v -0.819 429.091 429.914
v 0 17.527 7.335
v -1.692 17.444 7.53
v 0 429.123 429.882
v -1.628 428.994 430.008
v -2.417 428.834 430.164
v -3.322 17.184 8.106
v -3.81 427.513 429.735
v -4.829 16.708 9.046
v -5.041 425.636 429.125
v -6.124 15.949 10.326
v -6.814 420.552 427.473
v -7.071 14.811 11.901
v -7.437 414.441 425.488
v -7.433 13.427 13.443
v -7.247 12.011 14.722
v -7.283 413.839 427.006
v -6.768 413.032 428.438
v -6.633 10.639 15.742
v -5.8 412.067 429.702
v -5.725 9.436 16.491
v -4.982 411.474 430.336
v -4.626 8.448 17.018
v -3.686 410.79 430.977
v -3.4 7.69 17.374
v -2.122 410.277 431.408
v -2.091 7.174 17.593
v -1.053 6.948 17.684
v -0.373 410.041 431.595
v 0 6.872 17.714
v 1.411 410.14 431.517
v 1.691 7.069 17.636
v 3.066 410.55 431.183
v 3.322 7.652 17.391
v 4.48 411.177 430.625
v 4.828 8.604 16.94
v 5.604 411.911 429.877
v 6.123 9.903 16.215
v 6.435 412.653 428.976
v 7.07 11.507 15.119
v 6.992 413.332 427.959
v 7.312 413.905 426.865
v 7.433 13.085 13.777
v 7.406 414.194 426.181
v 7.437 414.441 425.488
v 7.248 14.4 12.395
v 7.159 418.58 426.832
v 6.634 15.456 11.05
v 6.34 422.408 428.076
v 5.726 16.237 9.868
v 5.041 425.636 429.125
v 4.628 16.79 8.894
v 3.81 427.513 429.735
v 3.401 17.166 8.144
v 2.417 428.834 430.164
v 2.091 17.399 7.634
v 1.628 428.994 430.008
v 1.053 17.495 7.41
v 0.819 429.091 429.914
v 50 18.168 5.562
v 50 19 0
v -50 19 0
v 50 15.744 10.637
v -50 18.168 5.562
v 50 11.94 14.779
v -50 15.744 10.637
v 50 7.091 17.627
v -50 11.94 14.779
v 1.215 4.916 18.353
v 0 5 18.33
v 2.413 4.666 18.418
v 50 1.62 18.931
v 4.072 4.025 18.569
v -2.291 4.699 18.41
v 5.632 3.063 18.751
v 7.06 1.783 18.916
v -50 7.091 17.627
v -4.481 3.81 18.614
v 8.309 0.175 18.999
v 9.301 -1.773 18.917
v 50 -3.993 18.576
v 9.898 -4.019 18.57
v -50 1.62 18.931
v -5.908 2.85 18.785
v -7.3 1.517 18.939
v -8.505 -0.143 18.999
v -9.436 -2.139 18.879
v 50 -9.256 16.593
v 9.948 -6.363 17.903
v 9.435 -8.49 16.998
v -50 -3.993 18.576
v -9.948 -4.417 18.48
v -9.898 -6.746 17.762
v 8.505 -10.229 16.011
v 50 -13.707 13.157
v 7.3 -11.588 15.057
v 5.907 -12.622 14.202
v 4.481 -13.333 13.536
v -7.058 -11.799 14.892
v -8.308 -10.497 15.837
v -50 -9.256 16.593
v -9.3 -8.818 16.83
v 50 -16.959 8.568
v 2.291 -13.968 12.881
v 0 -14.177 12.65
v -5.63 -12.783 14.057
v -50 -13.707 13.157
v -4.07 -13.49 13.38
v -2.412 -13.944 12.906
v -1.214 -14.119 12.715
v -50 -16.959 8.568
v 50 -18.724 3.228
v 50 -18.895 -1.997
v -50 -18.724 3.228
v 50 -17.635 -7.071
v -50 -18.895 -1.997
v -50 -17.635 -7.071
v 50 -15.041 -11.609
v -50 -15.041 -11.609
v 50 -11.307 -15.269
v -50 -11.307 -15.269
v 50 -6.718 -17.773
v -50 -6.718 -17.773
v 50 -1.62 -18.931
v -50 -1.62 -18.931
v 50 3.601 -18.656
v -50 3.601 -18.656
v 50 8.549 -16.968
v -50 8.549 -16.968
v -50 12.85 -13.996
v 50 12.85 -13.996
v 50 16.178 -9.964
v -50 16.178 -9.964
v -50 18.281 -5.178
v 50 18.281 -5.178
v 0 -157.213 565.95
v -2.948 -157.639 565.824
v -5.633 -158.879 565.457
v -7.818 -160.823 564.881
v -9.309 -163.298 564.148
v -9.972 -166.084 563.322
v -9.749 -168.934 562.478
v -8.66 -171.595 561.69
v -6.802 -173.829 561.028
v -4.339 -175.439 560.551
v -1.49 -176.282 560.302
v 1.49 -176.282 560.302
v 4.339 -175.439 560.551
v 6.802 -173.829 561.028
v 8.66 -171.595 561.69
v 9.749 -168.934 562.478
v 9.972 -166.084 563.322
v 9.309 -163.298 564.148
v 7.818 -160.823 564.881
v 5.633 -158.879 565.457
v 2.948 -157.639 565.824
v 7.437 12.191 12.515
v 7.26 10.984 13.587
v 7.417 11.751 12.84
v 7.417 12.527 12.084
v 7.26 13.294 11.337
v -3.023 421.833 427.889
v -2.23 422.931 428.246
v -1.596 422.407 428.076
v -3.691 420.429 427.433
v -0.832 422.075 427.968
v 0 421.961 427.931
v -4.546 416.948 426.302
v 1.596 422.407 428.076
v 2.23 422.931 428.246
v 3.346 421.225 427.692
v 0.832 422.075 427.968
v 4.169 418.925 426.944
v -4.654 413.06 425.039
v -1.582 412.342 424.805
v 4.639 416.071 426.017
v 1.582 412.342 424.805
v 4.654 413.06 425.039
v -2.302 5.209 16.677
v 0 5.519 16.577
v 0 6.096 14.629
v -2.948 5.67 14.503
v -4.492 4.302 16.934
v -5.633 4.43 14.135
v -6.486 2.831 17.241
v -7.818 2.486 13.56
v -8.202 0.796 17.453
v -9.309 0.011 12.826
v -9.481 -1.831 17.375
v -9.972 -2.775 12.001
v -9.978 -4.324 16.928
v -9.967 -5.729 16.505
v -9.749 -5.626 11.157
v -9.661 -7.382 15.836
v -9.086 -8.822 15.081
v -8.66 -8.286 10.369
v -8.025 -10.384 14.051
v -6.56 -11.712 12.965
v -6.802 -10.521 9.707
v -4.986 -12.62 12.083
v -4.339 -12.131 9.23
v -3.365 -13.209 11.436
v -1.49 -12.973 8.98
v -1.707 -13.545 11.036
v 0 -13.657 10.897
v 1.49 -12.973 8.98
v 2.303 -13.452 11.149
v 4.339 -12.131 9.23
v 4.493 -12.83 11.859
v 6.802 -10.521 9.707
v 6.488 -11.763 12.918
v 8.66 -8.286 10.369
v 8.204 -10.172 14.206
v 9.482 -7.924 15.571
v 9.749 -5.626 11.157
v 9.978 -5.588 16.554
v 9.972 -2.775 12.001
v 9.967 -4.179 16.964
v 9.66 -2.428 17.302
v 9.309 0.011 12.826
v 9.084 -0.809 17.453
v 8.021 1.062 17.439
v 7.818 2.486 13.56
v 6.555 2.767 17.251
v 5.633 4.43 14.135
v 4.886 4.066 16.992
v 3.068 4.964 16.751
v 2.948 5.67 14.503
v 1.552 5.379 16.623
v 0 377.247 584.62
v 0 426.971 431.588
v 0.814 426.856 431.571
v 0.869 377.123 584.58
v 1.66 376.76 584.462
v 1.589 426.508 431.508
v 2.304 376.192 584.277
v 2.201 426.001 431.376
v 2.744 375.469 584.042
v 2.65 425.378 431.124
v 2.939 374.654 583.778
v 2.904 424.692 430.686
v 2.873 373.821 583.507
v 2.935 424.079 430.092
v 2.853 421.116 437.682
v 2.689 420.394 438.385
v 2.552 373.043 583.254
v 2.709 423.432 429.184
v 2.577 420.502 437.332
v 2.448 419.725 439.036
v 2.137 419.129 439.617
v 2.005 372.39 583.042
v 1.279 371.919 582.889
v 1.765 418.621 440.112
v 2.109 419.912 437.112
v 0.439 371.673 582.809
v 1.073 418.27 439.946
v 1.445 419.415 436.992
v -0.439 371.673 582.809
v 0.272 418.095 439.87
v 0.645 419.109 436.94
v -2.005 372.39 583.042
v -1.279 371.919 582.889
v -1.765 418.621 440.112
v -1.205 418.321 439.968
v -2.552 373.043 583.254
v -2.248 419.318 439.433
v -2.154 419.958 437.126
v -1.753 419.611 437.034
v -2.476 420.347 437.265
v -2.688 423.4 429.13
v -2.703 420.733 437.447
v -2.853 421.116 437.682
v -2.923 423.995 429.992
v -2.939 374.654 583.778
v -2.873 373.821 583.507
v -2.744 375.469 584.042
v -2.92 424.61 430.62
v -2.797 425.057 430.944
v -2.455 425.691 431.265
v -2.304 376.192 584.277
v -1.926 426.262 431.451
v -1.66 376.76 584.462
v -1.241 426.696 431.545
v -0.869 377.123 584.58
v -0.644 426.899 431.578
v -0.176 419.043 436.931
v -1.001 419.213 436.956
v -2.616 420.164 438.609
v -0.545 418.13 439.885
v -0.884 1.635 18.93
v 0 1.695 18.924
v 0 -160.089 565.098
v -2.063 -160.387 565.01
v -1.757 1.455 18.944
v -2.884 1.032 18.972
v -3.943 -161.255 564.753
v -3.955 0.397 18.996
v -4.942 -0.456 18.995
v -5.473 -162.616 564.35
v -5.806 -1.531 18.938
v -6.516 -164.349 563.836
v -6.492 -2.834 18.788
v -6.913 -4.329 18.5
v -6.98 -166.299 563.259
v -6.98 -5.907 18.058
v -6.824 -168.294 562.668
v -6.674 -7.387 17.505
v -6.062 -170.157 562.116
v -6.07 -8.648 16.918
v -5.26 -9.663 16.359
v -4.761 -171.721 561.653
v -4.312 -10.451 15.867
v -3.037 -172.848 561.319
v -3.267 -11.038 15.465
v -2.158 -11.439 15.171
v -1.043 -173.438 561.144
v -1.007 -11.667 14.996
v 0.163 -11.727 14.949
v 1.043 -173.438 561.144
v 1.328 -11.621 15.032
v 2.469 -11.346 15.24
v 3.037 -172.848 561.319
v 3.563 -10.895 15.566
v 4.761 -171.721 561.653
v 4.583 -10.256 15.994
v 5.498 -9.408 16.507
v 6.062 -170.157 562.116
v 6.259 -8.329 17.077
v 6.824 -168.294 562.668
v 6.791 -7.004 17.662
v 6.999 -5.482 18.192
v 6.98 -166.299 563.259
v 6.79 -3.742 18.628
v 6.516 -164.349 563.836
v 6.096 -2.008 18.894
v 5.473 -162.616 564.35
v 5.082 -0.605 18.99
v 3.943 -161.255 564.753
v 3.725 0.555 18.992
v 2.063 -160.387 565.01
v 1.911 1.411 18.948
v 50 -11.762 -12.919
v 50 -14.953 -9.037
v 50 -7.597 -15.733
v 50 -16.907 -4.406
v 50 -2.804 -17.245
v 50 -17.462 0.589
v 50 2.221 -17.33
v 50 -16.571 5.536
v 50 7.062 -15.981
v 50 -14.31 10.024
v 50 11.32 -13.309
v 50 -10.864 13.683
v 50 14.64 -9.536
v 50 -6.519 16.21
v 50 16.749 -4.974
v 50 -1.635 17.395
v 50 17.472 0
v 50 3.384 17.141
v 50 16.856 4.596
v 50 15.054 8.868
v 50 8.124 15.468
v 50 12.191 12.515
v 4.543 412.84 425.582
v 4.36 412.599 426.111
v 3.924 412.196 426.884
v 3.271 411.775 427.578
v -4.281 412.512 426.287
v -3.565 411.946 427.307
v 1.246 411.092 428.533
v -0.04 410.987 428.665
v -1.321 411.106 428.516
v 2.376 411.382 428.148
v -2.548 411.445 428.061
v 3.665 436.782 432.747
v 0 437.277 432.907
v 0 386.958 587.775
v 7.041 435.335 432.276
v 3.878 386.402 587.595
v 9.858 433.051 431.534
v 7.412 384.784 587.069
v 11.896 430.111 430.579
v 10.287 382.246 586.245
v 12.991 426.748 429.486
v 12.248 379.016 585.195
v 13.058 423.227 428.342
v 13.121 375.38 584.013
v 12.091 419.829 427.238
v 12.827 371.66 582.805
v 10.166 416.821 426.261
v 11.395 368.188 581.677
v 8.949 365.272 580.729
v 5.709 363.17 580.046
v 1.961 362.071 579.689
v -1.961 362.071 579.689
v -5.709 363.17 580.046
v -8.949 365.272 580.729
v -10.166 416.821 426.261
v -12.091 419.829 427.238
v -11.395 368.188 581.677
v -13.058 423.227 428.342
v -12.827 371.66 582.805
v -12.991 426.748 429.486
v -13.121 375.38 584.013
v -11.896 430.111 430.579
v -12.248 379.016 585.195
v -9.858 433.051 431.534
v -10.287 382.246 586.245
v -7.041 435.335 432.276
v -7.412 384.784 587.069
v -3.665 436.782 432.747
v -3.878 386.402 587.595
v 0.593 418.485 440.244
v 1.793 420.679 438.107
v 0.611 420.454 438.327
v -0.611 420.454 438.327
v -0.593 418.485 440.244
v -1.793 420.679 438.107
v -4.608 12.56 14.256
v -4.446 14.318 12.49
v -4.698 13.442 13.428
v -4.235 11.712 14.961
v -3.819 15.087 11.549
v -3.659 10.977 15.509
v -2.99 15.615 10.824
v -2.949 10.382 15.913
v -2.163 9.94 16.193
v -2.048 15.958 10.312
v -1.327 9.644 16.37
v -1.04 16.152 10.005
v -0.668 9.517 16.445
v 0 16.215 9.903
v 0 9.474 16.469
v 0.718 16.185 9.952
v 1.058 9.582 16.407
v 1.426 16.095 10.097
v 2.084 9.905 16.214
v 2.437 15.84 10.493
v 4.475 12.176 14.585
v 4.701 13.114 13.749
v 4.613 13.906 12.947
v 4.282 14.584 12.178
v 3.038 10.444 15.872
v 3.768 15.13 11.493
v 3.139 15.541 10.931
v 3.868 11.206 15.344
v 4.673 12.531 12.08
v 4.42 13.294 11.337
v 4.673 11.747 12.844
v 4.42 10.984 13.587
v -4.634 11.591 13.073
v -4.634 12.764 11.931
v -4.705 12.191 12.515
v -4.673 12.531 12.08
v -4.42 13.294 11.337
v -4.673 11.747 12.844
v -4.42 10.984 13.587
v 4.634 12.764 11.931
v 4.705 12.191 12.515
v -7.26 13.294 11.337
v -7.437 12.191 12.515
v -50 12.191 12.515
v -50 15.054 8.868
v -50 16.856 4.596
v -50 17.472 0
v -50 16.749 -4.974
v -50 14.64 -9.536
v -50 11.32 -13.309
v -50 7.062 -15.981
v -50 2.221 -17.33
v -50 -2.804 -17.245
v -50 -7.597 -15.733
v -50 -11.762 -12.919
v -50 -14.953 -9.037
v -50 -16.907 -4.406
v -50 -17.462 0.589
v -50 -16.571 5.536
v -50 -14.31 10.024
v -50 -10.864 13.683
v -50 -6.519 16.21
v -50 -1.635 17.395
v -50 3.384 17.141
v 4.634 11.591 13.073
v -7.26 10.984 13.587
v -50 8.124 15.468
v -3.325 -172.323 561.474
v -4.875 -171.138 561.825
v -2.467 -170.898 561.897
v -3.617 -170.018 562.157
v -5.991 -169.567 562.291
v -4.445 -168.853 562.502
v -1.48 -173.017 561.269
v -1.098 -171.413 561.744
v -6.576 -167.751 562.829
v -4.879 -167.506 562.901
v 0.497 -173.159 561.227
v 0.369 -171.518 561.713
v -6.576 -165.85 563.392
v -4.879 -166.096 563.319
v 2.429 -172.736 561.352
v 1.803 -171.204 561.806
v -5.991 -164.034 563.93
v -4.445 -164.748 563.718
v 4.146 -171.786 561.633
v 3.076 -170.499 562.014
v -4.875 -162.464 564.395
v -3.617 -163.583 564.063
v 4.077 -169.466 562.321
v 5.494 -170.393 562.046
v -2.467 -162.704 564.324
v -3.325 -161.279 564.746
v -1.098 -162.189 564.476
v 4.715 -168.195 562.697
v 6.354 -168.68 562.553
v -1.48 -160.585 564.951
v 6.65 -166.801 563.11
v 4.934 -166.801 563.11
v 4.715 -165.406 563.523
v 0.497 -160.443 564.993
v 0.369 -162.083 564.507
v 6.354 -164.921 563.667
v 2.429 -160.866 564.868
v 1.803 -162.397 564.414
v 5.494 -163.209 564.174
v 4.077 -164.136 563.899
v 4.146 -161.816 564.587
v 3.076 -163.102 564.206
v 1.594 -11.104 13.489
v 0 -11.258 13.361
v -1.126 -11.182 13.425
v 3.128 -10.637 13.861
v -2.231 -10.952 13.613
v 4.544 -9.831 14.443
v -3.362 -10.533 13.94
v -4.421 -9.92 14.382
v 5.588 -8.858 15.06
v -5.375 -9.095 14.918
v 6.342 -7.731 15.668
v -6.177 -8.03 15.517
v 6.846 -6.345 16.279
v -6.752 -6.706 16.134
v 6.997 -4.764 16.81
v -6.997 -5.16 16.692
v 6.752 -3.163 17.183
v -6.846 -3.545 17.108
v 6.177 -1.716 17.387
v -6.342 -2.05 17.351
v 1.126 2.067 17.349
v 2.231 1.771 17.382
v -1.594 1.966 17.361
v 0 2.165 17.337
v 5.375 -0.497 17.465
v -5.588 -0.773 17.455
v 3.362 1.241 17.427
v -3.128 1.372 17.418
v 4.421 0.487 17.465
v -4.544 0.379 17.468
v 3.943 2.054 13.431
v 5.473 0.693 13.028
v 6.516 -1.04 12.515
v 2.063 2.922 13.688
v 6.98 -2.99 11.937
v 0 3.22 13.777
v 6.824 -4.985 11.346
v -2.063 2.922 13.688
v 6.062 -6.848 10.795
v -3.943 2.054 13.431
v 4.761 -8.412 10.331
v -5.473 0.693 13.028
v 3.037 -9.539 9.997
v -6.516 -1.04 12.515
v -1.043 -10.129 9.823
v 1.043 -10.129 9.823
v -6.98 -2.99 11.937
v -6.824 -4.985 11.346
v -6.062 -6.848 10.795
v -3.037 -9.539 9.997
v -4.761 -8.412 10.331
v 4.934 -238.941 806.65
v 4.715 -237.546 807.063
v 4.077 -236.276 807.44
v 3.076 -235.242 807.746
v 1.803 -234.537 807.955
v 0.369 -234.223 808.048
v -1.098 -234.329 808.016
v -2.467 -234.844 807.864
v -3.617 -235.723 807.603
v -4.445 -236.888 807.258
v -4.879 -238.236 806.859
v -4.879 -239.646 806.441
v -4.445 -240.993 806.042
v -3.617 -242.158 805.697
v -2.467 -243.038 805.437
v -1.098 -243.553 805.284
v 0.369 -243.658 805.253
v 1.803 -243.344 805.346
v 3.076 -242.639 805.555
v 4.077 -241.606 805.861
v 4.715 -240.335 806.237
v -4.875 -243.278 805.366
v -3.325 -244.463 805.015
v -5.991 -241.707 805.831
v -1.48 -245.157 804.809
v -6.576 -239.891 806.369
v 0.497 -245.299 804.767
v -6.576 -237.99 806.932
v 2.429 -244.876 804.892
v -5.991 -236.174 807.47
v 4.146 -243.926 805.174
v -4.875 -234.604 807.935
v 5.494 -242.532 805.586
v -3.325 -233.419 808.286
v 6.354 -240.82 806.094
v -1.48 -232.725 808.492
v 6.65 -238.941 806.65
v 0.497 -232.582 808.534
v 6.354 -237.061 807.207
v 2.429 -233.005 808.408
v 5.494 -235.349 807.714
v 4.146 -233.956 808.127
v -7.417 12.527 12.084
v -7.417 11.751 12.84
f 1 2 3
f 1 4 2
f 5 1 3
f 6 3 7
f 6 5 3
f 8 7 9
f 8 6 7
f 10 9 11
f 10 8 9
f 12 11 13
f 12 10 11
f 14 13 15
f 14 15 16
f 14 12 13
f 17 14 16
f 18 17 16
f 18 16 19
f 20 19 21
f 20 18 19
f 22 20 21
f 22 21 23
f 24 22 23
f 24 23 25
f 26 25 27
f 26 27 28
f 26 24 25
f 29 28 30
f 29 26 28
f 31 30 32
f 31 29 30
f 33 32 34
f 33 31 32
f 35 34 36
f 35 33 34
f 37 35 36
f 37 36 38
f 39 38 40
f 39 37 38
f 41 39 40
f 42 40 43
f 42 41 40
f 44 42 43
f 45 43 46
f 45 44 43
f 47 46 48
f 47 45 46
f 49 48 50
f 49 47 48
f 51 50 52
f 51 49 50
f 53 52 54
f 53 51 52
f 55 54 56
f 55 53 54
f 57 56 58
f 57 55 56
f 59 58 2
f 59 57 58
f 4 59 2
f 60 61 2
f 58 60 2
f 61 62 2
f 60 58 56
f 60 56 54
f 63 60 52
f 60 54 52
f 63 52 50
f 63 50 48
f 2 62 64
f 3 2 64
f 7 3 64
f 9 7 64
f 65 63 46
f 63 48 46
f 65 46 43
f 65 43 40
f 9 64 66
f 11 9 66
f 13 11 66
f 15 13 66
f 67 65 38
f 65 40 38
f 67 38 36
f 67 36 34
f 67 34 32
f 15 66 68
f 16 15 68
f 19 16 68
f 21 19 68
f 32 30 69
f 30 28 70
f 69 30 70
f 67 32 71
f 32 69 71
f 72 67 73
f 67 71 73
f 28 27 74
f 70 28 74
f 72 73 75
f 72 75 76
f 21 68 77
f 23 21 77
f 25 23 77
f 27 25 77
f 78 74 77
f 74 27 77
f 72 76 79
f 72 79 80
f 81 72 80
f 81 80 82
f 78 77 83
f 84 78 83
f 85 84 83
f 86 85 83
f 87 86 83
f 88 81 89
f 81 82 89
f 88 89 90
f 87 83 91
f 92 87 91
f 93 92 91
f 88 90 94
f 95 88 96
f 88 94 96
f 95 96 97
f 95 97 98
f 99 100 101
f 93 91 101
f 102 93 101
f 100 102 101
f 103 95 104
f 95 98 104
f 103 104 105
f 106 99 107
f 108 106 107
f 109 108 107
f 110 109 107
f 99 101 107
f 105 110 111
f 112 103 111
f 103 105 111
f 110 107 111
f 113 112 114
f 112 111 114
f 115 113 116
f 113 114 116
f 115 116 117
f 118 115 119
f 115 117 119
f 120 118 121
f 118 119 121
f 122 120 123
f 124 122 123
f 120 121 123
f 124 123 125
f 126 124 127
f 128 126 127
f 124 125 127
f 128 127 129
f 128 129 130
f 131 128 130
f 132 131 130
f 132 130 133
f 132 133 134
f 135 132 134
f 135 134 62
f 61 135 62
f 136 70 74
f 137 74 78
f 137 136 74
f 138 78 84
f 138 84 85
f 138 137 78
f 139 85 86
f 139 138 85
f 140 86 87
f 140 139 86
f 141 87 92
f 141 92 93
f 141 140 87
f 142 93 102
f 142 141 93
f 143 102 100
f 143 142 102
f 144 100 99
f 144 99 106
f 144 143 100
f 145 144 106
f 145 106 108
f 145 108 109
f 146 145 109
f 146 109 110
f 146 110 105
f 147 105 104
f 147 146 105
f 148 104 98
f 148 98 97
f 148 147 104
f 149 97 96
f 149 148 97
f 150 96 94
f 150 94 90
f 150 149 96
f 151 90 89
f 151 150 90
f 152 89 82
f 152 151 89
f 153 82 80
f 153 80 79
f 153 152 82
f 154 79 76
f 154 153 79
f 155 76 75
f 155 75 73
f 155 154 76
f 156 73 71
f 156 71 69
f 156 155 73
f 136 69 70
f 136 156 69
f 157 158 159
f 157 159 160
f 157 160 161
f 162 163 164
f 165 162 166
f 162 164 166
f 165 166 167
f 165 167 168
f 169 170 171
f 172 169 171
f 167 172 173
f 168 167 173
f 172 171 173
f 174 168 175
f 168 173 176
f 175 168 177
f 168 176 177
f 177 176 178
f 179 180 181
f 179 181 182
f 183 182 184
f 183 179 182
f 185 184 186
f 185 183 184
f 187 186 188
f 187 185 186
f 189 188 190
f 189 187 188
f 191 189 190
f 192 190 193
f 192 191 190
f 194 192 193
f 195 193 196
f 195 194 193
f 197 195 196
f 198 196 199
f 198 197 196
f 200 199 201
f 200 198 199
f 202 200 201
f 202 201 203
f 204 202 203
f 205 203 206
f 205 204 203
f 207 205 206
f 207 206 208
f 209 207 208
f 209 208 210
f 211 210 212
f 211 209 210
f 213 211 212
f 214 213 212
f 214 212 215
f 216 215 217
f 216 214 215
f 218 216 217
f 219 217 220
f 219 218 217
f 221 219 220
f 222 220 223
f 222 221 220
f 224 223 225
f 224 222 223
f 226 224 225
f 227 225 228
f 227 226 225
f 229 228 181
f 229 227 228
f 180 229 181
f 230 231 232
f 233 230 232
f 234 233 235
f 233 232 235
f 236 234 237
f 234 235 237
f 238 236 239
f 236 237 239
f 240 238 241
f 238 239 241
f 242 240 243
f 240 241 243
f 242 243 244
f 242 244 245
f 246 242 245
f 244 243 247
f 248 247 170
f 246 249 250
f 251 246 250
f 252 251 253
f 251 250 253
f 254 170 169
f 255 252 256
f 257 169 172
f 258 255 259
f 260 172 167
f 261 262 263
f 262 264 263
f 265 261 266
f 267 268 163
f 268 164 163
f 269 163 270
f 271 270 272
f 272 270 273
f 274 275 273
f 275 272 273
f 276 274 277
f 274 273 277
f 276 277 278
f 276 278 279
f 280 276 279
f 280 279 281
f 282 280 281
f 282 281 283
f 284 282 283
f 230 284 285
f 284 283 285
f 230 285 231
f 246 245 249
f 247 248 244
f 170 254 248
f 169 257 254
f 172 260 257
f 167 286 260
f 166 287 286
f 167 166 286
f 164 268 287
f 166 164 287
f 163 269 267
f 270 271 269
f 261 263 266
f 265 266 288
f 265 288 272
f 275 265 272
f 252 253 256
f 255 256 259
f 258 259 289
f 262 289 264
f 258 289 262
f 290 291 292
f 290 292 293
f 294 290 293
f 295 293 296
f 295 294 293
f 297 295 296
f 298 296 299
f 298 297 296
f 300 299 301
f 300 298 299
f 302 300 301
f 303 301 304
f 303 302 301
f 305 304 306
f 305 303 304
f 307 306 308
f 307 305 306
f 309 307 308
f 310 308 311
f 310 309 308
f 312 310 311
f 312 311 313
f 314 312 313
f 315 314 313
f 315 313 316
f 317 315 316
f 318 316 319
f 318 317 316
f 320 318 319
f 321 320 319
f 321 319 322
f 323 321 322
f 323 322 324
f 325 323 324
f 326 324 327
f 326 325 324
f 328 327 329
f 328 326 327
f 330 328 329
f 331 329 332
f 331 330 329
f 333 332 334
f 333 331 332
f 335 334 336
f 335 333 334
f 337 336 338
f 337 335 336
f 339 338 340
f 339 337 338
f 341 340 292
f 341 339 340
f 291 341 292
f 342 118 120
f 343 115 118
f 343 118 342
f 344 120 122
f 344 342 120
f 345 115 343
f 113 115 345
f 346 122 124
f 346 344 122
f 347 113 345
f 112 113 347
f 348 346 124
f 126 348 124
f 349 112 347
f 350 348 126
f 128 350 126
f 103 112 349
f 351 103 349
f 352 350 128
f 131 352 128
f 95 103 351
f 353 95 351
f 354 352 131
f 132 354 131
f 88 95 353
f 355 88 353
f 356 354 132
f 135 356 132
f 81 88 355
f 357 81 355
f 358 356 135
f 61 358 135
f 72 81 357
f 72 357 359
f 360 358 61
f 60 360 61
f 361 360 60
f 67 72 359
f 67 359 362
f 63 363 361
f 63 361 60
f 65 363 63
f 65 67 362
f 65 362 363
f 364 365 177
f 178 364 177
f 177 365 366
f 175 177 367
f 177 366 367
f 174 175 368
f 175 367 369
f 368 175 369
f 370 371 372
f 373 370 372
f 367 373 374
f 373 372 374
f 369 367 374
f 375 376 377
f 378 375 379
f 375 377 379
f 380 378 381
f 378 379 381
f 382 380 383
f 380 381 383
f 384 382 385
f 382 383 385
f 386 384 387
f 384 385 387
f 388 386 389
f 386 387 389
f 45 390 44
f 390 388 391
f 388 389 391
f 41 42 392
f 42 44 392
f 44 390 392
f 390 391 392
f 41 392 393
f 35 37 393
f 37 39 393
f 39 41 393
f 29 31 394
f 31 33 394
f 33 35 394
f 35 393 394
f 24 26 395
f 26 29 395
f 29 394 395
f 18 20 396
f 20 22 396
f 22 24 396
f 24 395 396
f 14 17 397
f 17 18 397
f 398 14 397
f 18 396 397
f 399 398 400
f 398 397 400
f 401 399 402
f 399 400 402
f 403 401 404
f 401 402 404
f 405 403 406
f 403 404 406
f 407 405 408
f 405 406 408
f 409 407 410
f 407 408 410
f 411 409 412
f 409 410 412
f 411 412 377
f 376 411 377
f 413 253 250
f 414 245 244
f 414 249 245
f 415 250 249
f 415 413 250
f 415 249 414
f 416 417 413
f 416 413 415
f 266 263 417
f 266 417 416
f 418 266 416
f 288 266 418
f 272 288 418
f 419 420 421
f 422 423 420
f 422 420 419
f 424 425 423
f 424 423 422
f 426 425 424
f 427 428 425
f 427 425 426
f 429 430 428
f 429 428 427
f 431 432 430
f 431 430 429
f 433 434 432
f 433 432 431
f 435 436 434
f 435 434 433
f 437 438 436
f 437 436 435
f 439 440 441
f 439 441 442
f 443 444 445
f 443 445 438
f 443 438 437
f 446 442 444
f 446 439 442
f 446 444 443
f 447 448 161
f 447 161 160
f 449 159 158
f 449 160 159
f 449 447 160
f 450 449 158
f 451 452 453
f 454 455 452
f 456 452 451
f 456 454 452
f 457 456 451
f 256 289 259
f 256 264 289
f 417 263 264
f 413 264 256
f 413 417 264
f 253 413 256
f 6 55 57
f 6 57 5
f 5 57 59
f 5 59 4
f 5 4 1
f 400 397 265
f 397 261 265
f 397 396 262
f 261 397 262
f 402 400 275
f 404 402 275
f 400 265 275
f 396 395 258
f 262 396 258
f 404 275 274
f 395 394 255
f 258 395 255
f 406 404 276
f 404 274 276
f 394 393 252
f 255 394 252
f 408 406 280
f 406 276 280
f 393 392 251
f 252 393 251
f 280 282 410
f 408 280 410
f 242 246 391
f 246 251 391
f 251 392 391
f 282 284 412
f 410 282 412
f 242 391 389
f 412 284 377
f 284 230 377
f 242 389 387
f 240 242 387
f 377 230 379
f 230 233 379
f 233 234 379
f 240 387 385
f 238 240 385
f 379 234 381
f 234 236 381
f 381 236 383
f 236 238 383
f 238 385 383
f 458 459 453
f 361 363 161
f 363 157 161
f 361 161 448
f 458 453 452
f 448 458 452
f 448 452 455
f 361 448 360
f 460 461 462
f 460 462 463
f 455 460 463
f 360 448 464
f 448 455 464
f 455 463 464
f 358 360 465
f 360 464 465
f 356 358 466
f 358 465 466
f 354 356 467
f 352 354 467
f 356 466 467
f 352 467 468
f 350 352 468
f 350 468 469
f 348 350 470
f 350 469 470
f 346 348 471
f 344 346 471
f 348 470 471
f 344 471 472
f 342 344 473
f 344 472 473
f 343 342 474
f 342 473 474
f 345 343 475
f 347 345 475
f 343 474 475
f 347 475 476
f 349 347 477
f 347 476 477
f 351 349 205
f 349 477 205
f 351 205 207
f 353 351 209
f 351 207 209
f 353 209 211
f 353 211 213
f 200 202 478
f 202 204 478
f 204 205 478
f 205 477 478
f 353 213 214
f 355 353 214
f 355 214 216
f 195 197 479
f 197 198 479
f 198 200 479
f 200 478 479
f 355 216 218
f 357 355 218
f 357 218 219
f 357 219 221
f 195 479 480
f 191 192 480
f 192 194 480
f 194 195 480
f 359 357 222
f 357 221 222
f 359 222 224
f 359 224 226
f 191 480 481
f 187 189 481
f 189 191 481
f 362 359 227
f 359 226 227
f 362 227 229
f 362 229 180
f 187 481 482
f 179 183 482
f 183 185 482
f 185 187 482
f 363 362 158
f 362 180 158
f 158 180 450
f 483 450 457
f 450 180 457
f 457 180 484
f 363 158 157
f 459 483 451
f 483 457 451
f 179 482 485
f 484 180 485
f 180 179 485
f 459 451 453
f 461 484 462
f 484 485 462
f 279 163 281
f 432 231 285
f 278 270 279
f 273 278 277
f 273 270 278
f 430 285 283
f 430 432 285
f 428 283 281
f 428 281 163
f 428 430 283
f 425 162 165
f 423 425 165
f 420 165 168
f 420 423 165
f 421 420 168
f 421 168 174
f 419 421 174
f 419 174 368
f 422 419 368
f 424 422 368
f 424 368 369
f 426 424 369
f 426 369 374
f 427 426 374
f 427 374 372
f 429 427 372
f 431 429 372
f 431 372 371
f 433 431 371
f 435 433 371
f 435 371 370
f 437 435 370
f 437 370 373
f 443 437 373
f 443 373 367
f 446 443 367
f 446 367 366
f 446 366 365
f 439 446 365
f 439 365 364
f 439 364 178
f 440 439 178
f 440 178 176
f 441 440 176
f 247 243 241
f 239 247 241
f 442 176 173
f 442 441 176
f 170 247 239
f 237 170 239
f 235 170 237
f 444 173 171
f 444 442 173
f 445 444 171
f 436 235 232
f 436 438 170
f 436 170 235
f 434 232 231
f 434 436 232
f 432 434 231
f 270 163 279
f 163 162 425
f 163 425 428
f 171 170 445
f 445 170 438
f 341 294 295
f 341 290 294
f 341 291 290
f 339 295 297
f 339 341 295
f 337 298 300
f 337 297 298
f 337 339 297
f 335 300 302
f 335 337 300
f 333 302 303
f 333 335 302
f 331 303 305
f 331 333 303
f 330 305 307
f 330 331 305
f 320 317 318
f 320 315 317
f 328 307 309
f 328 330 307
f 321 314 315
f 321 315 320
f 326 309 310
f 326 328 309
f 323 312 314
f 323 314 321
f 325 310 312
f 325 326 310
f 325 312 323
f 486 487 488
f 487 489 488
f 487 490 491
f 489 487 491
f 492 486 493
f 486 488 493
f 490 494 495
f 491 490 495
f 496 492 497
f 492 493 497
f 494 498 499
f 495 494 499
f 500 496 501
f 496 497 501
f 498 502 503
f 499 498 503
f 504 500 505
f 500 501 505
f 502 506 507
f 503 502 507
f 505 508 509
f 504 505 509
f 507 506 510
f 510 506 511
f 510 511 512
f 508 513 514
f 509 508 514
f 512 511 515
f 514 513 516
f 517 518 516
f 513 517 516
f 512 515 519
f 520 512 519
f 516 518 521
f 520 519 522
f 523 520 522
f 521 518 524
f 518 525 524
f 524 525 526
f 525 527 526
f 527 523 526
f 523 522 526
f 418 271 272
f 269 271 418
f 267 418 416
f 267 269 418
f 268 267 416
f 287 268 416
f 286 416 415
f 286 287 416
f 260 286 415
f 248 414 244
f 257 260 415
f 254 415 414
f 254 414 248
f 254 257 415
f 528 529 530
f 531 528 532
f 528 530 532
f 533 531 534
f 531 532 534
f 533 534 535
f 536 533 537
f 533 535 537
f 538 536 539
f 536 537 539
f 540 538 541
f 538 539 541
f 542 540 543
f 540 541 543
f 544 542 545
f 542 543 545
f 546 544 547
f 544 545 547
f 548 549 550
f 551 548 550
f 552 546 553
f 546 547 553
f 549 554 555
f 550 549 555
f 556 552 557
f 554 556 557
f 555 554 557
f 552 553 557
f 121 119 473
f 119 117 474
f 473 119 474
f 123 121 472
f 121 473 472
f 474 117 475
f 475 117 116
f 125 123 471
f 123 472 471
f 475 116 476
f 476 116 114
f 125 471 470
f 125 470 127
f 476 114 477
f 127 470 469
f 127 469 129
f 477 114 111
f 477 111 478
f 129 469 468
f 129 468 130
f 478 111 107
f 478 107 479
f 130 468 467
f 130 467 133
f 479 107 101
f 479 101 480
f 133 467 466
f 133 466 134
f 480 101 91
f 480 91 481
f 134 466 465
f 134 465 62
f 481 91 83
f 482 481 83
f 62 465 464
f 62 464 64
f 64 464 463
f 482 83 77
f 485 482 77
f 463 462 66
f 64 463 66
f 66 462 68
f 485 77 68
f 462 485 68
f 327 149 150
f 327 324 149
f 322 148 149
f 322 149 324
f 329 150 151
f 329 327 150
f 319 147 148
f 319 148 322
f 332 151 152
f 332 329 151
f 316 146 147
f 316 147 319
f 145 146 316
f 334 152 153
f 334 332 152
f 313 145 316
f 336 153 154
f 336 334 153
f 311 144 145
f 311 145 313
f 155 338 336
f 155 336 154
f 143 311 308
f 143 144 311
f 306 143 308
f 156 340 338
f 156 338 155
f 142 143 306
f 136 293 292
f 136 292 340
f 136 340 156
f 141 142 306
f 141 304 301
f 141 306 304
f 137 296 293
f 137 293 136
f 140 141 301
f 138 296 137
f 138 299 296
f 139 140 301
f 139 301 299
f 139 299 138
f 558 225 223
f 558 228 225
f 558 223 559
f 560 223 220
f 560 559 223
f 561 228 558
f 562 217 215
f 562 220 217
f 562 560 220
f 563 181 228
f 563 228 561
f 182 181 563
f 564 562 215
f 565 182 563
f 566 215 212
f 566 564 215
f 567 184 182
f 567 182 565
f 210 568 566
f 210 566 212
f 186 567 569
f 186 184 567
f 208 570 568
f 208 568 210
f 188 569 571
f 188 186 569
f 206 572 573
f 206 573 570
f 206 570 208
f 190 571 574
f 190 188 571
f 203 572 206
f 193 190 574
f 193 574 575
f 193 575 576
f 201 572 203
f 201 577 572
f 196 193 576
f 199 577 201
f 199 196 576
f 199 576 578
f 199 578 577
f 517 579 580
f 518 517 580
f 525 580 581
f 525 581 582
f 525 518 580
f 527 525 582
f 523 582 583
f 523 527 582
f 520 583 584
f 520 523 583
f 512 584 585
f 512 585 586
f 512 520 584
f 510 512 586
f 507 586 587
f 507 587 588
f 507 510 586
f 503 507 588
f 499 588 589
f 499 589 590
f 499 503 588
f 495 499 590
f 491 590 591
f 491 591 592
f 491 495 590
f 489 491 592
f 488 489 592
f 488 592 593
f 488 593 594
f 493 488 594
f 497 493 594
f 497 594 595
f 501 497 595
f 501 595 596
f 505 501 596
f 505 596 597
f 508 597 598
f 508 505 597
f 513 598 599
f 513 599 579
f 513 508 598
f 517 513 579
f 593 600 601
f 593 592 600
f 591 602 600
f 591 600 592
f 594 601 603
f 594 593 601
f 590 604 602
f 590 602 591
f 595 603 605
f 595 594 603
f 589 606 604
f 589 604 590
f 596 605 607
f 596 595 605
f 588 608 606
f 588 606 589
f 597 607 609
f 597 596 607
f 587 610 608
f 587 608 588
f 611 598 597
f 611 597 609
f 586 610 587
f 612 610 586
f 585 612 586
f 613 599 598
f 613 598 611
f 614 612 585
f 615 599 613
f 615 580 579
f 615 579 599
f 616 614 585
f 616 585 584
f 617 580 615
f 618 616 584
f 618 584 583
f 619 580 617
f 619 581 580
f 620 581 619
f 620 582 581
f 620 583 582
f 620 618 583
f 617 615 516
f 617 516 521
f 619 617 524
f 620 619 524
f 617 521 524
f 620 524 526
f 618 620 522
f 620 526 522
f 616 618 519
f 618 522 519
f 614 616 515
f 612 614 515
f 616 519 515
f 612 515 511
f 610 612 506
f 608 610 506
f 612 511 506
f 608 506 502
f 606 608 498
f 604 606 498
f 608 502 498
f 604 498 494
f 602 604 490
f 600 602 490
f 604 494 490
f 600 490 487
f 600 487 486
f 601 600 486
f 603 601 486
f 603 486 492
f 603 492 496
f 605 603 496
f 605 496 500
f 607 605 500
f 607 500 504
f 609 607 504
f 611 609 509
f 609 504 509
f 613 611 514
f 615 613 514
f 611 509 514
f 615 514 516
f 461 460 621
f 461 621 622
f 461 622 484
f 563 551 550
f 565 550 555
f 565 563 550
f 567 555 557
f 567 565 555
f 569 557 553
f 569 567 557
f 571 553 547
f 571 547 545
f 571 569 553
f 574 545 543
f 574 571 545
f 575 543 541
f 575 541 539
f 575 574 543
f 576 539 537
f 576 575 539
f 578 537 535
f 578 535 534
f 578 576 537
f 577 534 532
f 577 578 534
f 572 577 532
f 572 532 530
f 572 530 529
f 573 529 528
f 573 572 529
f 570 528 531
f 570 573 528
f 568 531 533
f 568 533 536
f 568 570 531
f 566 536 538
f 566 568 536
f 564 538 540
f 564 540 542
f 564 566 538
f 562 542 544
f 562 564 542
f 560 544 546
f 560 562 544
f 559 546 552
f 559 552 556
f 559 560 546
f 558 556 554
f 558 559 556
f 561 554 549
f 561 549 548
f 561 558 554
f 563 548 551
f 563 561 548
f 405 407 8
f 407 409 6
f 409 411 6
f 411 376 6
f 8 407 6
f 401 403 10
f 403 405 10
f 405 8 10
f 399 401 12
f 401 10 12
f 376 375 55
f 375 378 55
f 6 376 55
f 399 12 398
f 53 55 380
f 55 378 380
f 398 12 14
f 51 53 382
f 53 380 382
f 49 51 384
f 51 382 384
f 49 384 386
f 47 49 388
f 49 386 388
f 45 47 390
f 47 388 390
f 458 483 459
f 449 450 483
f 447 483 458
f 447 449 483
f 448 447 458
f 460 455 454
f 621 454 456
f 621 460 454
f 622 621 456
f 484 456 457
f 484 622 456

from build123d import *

# Parameters (mm, degrees)
F1_DEPTH      = 50
F1_DEPTH_BACK = 50
F4_R          = 6.6498858901
F4_R_2        = 4.9338425648
F5_DEPTH      = 254


with BuildPart() as f1:
    # F0 (on Right) → F1 (new body, two sides)
    with BuildSketch(Plane.YZ) as f1_sk:
        with BuildLine():
            Line((-17.2175823491, 2.9685486809), (-18.7237421991, 3.2282314136))
            ThreePointArc((-18.7237421991, 3.2282314136), (-1.6200151568, -18.9308095678), (19, 0))
            ThreePointArc((19, 0), (17.5056067439, 7.3860498596), (13.2575018392, 13.6102404455))
            Line((13.2575018392, 13.6102404455), (12.1910527944, 12.5154166923))
            ThreePointArc((12.1910527944, 12.5154166923), (16.0974351429, 6.7919073195), (17.4716176474, 0))
            ThreePointArc((17.4716176474, 0), (-1.4896992317, -17.407992975), (-17.2175823491, 2.9685486809))
        make_face()
        with BuildLine():
            ThreePointArc((13.2575018392, 13.6102404455), (-5.8665555314, 18.0716221241), (-18.7237421991, 3.2282314136))
            Line((-18.7237421991, 3.2282314136), (-17.2175823491, 2.9685486809))
            ThreePointArc((-17.2175823491, 2.9685486809), (-5.3946429027, 16.6179195801), (12.1910527944, 12.5154166923))
            Line((12.1910527944, 12.5154166923), (13.2575018392, 13.6102404455))
        make_face()
    extrude(amount=-F1_DEPTH)
    extrude(f1_sk.sketch, amount=F1_DEPTH_BACK)

    # F2 (on Right) → F3 (revolve)
    with BuildSketch(Plane.YZ):
        Polygon((3.2197641066, 13.7768141966), (6.0962233112, 14.6288602307), (-157.2125998935, 565.9502077799), (-160.0890590981, 565.0981617458), align=None)
    revolve(axis=Axis((0, -73.843989623, 249.2931310657), (0, -0.2840153447, 0.9588197349)))

    # F6 (on Right) → F7 (revolve)
    with BuildSketch(Plane.YZ):
        Polygon((427.166134119, 431.7882955074), (15.5095142238, 9.1788442143), (17.4662787467, 7.2727934457), (429.122898642, 429.8822447389), align=None)
    revolve(axis=Axis((0, 209.7269668516, 215.3071130135), (0, 0.6977632547, 0.7163284445)))

    # F8 (on Right) → F9 (revolve)
    with BuildSketch(Plane.YZ):
        Polygon((427.5671455208, 429.7524078395), (437.2774958611, 432.9074919224), (386.9578340125, 587.7754867899), (377.2474836722, 584.620402707), align=None)
    revolve(axis=Axis((0, 399.72135955, 505.9154786964), (0, 0.3090169944, -0.9510565163)))


with BuildPart() as f5:
    # F4 (on face) → F5 (new body)
    with BuildSketch(Plane(origin=(0, -166.8007972422, 563.1100543329), x_dir=(1, 0, 0), z_dir=(0, -0.2840153447, 0.9588197349))):
        Circle(F4_R)
        Circle(F4_R_2, mode=Mode.SUBTRACT)
    extrude(amount=F5_DEPTH)


solid = Compound([f1.part, f5.part])
